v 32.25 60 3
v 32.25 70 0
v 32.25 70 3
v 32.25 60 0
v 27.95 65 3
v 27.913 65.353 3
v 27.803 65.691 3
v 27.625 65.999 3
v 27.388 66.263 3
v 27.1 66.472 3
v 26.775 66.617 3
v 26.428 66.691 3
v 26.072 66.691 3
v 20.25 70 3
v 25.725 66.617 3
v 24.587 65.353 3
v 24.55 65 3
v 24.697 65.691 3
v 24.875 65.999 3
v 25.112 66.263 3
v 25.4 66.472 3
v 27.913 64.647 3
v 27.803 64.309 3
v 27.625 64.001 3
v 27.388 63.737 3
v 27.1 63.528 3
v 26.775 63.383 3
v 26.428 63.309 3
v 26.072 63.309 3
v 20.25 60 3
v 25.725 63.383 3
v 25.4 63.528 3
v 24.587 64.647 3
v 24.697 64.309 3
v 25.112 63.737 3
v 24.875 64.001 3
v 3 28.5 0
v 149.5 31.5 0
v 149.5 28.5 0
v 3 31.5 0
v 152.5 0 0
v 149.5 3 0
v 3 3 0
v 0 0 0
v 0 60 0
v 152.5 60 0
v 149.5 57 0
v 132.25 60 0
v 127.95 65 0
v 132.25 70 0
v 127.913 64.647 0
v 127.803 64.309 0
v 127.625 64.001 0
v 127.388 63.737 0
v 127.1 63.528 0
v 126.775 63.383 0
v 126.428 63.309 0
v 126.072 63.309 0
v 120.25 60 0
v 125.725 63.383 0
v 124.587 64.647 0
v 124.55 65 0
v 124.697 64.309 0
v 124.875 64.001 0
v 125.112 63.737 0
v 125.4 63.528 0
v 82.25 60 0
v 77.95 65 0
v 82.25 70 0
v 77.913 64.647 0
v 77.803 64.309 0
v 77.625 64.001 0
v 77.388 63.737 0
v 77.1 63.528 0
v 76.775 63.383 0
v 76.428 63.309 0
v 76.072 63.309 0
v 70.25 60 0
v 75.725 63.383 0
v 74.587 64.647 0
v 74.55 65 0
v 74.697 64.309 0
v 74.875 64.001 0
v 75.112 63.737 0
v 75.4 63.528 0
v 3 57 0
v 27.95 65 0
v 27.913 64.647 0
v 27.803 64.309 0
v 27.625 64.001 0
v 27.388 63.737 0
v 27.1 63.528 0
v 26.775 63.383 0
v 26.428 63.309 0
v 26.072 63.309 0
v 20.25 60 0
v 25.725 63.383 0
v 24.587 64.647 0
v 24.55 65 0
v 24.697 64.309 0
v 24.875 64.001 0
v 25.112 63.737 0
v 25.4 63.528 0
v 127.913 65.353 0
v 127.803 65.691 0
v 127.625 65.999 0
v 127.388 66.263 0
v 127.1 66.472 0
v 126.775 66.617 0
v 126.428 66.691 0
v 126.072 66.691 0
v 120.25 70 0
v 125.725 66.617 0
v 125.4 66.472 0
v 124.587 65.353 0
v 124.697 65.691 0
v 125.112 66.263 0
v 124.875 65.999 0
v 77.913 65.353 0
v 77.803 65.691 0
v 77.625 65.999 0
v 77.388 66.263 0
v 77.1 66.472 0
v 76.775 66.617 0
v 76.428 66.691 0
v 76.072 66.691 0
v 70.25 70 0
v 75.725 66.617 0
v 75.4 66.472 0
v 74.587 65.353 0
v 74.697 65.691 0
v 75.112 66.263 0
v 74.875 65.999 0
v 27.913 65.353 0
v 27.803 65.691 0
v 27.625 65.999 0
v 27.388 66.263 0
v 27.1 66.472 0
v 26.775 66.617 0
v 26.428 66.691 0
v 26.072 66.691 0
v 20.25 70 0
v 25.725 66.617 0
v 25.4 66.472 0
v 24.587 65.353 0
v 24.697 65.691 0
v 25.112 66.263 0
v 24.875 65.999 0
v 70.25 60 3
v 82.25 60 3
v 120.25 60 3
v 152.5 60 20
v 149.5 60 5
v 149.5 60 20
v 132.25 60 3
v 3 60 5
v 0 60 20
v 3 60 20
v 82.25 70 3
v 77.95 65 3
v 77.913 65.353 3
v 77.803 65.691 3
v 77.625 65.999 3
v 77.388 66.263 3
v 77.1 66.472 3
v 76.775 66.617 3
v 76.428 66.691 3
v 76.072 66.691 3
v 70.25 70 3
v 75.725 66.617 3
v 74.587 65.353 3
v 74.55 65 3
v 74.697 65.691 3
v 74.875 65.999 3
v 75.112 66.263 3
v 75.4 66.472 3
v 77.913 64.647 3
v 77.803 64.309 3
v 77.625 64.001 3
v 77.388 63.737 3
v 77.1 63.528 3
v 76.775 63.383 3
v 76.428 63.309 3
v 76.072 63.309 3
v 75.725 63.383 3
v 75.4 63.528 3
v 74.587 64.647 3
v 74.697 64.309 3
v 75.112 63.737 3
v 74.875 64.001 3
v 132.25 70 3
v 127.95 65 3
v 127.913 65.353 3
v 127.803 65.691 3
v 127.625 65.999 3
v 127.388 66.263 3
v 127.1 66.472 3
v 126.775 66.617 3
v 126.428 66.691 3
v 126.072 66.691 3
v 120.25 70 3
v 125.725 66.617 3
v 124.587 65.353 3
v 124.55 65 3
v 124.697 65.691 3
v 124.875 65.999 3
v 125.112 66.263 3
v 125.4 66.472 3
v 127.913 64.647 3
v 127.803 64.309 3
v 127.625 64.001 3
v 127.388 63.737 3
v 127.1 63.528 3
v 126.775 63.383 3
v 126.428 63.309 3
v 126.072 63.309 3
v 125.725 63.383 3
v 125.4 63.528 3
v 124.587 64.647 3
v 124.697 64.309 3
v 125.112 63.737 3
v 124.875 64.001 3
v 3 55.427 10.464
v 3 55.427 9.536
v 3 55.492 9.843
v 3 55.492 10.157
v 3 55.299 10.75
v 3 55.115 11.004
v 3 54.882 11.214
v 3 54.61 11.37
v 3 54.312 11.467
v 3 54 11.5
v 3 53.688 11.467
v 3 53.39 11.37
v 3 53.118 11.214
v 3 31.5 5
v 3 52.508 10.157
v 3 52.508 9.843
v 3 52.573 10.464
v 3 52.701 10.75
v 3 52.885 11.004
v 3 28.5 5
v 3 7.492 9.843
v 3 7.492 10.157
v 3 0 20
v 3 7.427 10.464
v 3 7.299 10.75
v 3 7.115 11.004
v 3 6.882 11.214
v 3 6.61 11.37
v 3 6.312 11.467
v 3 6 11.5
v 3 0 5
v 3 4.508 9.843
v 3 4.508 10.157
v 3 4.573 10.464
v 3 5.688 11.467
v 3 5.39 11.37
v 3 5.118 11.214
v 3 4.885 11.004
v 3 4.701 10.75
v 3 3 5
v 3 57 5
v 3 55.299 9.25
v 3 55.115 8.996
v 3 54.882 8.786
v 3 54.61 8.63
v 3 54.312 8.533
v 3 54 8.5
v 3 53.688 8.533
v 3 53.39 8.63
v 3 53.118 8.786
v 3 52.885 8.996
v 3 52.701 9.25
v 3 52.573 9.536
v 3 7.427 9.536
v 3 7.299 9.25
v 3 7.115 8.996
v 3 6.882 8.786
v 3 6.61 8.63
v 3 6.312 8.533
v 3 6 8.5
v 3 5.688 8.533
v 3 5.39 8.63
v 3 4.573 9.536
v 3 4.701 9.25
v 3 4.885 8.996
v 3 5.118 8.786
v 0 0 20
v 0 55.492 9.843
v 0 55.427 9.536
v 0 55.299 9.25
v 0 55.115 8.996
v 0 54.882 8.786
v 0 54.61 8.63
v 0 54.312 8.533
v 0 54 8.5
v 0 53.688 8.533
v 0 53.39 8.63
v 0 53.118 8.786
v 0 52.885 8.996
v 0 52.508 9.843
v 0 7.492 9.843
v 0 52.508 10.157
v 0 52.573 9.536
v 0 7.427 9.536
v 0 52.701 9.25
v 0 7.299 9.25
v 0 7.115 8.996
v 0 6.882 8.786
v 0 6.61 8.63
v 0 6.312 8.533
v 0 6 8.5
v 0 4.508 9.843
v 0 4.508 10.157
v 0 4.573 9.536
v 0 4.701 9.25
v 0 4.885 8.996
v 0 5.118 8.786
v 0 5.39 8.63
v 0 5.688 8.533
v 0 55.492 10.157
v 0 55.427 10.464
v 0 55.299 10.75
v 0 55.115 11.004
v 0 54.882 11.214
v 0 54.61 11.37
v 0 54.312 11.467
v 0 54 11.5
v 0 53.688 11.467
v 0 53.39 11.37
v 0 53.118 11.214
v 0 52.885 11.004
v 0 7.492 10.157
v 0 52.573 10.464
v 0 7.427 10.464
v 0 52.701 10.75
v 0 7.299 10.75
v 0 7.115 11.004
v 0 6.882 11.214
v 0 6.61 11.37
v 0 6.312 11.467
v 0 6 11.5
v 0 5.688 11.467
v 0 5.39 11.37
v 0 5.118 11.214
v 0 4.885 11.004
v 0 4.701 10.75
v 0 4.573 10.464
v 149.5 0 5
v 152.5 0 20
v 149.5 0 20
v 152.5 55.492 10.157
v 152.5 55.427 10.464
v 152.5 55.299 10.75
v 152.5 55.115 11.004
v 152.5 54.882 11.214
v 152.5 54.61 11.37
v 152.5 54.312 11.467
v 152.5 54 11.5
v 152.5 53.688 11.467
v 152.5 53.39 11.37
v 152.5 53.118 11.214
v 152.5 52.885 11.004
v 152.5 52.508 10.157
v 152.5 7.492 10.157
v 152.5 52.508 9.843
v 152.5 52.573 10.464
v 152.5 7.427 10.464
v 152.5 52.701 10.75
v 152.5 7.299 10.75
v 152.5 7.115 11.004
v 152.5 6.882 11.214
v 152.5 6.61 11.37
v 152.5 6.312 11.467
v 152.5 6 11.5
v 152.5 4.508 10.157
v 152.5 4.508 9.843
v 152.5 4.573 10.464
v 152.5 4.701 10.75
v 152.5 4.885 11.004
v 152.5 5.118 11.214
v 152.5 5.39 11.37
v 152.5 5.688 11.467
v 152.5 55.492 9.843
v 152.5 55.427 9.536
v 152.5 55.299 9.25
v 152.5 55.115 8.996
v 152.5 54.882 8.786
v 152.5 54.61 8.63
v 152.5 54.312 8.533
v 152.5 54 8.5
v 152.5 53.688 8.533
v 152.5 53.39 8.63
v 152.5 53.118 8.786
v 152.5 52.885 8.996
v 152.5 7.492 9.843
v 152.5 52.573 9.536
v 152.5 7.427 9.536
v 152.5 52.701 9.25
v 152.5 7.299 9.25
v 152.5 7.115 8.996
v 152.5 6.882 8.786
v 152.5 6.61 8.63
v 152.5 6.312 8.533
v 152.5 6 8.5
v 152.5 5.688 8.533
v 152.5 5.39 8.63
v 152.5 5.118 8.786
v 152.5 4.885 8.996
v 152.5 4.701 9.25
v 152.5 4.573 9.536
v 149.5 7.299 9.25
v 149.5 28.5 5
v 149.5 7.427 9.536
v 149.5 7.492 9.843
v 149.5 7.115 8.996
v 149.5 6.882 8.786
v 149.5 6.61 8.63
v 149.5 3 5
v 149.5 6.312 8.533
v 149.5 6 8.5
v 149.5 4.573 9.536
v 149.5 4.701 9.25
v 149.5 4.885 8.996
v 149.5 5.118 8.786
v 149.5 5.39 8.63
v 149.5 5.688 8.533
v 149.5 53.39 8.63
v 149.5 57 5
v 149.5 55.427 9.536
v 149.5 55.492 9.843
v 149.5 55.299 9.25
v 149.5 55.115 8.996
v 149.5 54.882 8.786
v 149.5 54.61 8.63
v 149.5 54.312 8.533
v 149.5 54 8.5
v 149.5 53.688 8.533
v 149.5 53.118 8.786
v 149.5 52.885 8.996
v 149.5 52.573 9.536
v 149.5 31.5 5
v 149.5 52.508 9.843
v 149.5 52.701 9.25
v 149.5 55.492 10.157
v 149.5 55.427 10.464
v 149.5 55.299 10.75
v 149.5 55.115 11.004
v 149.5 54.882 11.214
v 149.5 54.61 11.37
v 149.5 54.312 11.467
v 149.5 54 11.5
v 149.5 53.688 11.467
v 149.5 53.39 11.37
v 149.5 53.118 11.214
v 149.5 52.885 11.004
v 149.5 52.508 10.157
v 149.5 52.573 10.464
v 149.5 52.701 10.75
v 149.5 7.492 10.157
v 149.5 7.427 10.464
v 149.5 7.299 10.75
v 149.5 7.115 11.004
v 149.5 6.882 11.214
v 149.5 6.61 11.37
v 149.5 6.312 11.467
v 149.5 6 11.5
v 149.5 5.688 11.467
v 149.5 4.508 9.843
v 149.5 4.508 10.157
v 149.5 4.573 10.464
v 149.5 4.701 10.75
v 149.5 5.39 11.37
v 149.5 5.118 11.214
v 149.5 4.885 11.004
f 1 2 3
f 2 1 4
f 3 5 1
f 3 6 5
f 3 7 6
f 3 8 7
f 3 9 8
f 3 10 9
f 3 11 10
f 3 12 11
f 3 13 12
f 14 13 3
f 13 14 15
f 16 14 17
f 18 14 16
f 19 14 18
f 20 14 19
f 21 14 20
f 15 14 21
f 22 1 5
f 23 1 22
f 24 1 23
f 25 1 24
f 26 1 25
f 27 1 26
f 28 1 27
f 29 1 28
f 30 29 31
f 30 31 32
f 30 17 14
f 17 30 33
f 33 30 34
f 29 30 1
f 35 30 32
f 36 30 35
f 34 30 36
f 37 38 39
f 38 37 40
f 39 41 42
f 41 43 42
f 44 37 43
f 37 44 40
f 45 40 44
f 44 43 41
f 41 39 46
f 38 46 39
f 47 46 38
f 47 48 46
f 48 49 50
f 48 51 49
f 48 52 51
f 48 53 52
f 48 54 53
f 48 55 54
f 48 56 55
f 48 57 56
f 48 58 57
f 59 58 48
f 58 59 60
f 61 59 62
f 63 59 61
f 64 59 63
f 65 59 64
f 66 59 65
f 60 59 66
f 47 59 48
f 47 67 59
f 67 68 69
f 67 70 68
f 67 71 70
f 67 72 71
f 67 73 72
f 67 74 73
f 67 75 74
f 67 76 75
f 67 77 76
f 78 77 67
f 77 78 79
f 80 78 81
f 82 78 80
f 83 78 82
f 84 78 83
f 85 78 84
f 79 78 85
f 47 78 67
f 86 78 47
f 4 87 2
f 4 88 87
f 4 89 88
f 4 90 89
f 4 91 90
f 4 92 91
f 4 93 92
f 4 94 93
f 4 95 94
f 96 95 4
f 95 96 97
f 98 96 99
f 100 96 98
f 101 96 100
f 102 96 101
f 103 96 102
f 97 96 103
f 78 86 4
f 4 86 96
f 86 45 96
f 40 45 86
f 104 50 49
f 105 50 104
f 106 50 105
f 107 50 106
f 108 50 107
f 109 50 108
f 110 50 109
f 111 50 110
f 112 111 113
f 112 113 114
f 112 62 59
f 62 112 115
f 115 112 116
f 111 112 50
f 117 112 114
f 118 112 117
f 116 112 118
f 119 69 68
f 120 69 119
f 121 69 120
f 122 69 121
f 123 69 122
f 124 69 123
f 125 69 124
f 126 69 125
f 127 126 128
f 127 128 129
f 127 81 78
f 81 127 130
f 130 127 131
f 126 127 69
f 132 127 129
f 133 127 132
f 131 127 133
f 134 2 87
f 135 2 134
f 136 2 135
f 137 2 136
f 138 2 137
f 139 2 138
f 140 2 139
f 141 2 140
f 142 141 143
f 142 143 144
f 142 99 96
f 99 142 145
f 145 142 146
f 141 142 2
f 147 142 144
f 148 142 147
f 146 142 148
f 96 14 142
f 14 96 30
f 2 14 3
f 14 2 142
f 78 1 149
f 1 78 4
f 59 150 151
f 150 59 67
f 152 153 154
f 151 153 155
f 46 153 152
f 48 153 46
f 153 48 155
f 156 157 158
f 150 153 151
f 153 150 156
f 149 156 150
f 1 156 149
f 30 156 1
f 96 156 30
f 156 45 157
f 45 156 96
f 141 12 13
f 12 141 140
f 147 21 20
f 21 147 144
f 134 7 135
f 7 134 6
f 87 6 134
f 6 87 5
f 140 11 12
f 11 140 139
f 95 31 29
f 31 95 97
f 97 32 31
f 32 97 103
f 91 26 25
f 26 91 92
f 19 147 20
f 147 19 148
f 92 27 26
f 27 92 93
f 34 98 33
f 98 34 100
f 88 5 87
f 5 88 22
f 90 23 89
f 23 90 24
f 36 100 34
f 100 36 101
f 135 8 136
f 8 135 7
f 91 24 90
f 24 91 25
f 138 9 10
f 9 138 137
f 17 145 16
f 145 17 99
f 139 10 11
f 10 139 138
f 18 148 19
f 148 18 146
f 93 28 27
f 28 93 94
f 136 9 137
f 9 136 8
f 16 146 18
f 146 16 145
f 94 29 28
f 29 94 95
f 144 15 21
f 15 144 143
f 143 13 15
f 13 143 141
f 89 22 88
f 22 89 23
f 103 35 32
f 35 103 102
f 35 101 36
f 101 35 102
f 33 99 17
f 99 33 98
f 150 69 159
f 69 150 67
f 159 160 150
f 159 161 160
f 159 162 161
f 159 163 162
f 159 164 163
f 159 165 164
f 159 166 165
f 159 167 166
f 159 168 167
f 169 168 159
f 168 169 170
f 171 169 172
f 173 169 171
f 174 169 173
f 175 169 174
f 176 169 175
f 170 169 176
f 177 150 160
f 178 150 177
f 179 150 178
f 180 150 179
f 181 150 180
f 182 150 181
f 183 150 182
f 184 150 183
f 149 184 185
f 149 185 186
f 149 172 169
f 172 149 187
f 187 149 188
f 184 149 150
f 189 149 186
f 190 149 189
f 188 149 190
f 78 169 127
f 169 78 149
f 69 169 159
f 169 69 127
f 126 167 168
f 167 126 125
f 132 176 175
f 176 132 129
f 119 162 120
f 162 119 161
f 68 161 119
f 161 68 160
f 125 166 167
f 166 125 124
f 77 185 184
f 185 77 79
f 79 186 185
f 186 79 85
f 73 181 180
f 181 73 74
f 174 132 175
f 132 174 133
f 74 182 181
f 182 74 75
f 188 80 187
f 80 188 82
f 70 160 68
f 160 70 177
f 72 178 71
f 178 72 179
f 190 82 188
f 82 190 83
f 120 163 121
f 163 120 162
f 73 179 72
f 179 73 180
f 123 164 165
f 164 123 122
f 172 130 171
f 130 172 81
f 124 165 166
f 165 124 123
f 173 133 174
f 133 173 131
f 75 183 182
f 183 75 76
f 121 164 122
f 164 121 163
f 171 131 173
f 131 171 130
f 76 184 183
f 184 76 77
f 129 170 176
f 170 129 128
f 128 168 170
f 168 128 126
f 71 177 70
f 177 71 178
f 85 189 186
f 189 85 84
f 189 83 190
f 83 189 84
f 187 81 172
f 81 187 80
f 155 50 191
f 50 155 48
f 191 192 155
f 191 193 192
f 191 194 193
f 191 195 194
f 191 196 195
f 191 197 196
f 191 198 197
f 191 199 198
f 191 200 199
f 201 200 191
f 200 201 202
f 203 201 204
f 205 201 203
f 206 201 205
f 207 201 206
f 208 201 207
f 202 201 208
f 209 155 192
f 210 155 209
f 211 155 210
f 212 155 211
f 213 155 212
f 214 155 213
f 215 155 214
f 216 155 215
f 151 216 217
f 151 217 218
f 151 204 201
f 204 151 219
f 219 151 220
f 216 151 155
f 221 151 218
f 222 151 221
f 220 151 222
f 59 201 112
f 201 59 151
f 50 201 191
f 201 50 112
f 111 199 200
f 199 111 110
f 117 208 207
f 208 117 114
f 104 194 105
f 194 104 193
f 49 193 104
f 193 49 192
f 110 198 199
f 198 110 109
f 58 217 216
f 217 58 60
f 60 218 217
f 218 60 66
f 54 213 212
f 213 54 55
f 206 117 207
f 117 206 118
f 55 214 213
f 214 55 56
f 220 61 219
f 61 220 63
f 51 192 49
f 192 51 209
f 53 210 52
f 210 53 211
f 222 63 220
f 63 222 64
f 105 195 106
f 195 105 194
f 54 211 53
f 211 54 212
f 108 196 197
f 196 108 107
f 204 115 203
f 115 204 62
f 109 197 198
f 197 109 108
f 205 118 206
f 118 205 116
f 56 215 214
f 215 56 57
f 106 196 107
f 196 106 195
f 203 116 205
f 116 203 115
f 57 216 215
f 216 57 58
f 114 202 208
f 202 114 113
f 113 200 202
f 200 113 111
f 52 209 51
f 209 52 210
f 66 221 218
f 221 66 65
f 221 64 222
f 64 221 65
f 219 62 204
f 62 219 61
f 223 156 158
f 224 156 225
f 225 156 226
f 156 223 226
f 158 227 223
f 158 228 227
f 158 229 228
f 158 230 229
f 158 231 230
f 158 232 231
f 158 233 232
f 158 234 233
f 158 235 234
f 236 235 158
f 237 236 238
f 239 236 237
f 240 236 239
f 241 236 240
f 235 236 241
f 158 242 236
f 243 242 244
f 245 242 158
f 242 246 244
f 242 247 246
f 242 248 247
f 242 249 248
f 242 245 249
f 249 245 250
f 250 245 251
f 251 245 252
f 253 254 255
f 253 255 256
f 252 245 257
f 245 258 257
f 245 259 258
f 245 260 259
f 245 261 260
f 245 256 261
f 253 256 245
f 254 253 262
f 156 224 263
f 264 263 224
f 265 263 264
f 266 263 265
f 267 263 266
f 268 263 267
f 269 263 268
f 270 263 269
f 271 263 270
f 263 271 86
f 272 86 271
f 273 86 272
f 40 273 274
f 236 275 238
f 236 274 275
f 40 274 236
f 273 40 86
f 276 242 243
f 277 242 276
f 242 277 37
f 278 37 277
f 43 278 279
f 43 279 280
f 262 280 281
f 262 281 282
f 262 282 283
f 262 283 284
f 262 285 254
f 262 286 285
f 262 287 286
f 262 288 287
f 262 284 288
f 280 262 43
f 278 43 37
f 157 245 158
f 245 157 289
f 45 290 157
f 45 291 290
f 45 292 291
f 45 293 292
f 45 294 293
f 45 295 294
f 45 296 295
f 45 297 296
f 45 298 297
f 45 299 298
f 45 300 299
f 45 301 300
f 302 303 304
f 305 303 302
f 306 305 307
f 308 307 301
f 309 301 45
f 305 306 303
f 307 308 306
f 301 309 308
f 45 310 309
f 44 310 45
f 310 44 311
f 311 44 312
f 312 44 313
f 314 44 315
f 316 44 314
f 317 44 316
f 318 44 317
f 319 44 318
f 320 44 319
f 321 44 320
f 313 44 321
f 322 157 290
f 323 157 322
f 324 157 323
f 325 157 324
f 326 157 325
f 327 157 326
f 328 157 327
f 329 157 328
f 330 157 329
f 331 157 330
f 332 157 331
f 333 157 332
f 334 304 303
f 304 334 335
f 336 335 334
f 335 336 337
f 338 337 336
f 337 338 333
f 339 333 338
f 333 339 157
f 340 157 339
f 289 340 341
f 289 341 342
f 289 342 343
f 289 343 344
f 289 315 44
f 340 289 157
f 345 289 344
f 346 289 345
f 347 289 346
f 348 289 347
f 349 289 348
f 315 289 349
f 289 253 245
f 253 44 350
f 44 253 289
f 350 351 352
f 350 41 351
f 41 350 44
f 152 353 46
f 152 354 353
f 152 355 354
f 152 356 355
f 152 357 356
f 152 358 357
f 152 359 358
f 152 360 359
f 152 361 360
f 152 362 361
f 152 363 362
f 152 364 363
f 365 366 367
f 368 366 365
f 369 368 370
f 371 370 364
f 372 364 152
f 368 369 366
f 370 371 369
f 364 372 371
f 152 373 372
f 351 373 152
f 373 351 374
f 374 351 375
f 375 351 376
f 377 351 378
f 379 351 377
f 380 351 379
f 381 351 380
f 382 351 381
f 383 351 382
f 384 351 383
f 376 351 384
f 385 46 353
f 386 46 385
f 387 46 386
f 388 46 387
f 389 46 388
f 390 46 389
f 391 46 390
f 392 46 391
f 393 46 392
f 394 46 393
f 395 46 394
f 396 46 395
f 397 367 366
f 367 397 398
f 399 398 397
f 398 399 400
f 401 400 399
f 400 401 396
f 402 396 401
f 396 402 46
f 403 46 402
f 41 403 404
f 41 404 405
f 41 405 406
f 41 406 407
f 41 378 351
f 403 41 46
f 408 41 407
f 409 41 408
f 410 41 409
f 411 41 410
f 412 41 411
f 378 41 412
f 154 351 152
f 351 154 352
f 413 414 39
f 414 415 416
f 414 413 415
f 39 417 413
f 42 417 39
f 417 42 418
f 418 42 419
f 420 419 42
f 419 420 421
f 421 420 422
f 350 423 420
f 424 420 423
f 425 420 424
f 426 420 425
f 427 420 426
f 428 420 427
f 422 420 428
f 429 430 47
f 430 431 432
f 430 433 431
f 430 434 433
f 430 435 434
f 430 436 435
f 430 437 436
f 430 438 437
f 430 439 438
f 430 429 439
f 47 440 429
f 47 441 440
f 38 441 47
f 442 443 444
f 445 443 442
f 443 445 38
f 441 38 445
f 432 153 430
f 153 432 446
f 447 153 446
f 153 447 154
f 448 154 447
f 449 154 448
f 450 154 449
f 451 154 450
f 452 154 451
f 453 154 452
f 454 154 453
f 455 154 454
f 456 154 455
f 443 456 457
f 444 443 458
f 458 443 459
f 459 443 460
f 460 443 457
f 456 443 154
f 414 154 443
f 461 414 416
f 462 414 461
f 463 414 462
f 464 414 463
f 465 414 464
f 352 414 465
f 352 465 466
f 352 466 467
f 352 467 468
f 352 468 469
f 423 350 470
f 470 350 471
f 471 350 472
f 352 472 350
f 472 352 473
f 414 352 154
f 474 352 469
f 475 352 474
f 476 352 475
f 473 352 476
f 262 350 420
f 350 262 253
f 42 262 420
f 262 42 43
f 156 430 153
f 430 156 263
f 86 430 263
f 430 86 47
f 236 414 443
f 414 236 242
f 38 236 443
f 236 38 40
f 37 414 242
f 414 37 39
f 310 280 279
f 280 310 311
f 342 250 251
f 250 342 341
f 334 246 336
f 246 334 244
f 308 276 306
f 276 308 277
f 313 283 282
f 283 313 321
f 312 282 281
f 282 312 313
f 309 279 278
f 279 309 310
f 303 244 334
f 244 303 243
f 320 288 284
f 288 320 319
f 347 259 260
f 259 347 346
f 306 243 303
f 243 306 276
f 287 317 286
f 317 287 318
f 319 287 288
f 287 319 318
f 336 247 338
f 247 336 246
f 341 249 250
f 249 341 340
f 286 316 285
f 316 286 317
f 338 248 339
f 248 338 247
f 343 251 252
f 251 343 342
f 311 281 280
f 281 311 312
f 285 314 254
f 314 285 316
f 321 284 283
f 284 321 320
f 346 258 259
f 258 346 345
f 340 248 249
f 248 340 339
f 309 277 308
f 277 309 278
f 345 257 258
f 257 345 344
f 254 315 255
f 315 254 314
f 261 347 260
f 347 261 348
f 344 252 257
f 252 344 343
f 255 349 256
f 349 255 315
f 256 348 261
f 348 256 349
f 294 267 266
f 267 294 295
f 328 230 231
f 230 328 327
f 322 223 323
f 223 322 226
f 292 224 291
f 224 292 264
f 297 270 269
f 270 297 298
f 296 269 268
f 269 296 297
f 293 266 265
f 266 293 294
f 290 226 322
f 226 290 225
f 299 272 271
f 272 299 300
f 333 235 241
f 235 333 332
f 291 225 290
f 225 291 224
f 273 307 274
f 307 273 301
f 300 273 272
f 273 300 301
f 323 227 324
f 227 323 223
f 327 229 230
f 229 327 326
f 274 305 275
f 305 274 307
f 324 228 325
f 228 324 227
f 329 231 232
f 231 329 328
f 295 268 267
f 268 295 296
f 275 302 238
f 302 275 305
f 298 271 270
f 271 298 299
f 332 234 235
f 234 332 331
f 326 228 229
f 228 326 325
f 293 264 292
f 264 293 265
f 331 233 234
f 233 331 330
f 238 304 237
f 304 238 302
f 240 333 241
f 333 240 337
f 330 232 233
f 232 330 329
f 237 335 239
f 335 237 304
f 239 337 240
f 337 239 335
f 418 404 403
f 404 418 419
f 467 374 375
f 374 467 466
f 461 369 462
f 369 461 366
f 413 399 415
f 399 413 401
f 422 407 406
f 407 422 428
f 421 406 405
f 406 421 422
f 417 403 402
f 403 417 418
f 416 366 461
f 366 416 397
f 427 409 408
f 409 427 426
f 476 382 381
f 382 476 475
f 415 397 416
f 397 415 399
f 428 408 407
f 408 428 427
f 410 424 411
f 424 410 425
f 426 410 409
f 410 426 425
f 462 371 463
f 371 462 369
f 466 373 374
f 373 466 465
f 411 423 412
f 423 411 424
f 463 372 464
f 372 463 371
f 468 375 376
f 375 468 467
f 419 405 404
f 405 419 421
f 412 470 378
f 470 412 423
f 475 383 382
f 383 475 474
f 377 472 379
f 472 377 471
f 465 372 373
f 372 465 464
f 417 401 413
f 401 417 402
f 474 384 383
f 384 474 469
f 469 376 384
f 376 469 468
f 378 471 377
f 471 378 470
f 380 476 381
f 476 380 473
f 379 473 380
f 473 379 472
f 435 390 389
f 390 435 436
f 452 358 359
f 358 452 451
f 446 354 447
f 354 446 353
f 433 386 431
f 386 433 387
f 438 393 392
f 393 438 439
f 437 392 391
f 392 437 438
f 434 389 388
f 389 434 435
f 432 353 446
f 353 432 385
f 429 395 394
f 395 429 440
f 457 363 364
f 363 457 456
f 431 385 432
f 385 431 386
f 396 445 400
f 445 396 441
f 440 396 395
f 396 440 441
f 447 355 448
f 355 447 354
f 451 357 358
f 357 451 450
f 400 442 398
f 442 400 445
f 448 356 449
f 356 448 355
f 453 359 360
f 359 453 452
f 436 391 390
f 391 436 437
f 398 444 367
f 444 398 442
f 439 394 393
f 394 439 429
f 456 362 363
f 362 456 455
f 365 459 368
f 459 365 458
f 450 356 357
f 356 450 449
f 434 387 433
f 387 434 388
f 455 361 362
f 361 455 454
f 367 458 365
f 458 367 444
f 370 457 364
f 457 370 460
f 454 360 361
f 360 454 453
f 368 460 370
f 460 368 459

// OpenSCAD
// FoldIt Robot - Conveyor Belt Frame
// Scale: 1:4 (full-scale conveyor ~240mm / 9.5" long)
// Sits at front/intake edge of the base plate
// Two side walls with roller axle holes, open top for belt
//
// PRINT GUIDANCE: Print upright with side walls vertical.
// Mounting tabs on bed. No supports needed.

$fn = 30;

// Frame dimensions at 1:4 scale
frame_width = 152.5;      // matches base plate width
frame_length = 60;         // conveyor depth (~240mm full / 4)
frame_height = 20;         // raises belt surface to base plate level
wall_thickness = 3;

// Roller parameters
roller_dia = 8;            // roller diameter
axle_dia = 3;              // axle hole diameter (fits M3 rod)
axle_inset = 6;            // axle center distance from front/back edges
axle_z = frame_height / 2; // axle center height

// Mounting tab parameters
tab_width = 12;
tab_length = 10;           // extends beyond frame toward base plate
tab_thickness = 3;
tab_hole_dia = 3.4;        // M3 clearance
tab_count = 3;
tab_spacing = 50;          // spacing between tab centers
tab_x_start = (frame_width - (tab_count - 1) * tab_spacing) / 2;

// Cross brace (bottom, connects side walls)
brace_height = 5;

module belt_frame() {
    difference() {
        union() {
            // Left side wall
            cube([wall_thickness, frame_length, frame_height]);

            // Right side wall
            translate([frame_width - wall_thickness, 0, 0])
                cube([wall_thickness, frame_length, frame_height]);

            // Bottom cross braces (front and rear)
            _cross_brace(y_pos = 0);
            _cross_brace(y_pos = frame_length - wall_thickness);

            // Center cross brace
            _cross_brace(y_pos = (frame_length - wall_thickness) / 2);

            // Mounting tabs along rear edge (attach to base plate front)
            _mounting_tabs();
        }

        // Roller axle holes - left wall
        _axle_holes(x_pos = -0.5, depth = wall_thickness + 1);

        // Roller axle holes - right wall
        _axle_holes(x_pos = frame_width - wall_thickness - 0.5,
                    depth = wall_thickness + 1);
    }
}

module _cross_brace(y_pos) {
    translate([wall_thickness, y_pos, 0])
        cube([frame_width - wall_thickness * 2, wall_thickness, brace_height]);
}

module _axle_holes(x_pos, depth) {
    // Front roller axle
    translate([x_pos, axle_inset, axle_z])
        rotate([0, 90, 0])
            cylinder(d=axle_dia, h=depth);

    // Rear roller axle
    translate([x_pos, frame_length - axle_inset, axle_z])
        rotate([0, 90, 0])
            cylinder(d=axle_dia, h=depth);
}

module _mounting_tabs() {
    for (i = [0 : tab_count - 1]) {
        x_pos = tab_x_start + i * tab_spacing - tab_width / 2;
        difference() {
            // Tab body extending from rear edge
            translate([x_pos, frame_length, 0])
                cube([tab_width, tab_length, tab_thickness]);

            // Mounting hole
            translate([x_pos + tab_width / 2,
                       frame_length + tab_length / 2,
                       -0.5])
                cylinder(d=tab_hole_dia, h=tab_thickness + 1);
        }
    }
}

// Render when opened directly
belt_frame();
